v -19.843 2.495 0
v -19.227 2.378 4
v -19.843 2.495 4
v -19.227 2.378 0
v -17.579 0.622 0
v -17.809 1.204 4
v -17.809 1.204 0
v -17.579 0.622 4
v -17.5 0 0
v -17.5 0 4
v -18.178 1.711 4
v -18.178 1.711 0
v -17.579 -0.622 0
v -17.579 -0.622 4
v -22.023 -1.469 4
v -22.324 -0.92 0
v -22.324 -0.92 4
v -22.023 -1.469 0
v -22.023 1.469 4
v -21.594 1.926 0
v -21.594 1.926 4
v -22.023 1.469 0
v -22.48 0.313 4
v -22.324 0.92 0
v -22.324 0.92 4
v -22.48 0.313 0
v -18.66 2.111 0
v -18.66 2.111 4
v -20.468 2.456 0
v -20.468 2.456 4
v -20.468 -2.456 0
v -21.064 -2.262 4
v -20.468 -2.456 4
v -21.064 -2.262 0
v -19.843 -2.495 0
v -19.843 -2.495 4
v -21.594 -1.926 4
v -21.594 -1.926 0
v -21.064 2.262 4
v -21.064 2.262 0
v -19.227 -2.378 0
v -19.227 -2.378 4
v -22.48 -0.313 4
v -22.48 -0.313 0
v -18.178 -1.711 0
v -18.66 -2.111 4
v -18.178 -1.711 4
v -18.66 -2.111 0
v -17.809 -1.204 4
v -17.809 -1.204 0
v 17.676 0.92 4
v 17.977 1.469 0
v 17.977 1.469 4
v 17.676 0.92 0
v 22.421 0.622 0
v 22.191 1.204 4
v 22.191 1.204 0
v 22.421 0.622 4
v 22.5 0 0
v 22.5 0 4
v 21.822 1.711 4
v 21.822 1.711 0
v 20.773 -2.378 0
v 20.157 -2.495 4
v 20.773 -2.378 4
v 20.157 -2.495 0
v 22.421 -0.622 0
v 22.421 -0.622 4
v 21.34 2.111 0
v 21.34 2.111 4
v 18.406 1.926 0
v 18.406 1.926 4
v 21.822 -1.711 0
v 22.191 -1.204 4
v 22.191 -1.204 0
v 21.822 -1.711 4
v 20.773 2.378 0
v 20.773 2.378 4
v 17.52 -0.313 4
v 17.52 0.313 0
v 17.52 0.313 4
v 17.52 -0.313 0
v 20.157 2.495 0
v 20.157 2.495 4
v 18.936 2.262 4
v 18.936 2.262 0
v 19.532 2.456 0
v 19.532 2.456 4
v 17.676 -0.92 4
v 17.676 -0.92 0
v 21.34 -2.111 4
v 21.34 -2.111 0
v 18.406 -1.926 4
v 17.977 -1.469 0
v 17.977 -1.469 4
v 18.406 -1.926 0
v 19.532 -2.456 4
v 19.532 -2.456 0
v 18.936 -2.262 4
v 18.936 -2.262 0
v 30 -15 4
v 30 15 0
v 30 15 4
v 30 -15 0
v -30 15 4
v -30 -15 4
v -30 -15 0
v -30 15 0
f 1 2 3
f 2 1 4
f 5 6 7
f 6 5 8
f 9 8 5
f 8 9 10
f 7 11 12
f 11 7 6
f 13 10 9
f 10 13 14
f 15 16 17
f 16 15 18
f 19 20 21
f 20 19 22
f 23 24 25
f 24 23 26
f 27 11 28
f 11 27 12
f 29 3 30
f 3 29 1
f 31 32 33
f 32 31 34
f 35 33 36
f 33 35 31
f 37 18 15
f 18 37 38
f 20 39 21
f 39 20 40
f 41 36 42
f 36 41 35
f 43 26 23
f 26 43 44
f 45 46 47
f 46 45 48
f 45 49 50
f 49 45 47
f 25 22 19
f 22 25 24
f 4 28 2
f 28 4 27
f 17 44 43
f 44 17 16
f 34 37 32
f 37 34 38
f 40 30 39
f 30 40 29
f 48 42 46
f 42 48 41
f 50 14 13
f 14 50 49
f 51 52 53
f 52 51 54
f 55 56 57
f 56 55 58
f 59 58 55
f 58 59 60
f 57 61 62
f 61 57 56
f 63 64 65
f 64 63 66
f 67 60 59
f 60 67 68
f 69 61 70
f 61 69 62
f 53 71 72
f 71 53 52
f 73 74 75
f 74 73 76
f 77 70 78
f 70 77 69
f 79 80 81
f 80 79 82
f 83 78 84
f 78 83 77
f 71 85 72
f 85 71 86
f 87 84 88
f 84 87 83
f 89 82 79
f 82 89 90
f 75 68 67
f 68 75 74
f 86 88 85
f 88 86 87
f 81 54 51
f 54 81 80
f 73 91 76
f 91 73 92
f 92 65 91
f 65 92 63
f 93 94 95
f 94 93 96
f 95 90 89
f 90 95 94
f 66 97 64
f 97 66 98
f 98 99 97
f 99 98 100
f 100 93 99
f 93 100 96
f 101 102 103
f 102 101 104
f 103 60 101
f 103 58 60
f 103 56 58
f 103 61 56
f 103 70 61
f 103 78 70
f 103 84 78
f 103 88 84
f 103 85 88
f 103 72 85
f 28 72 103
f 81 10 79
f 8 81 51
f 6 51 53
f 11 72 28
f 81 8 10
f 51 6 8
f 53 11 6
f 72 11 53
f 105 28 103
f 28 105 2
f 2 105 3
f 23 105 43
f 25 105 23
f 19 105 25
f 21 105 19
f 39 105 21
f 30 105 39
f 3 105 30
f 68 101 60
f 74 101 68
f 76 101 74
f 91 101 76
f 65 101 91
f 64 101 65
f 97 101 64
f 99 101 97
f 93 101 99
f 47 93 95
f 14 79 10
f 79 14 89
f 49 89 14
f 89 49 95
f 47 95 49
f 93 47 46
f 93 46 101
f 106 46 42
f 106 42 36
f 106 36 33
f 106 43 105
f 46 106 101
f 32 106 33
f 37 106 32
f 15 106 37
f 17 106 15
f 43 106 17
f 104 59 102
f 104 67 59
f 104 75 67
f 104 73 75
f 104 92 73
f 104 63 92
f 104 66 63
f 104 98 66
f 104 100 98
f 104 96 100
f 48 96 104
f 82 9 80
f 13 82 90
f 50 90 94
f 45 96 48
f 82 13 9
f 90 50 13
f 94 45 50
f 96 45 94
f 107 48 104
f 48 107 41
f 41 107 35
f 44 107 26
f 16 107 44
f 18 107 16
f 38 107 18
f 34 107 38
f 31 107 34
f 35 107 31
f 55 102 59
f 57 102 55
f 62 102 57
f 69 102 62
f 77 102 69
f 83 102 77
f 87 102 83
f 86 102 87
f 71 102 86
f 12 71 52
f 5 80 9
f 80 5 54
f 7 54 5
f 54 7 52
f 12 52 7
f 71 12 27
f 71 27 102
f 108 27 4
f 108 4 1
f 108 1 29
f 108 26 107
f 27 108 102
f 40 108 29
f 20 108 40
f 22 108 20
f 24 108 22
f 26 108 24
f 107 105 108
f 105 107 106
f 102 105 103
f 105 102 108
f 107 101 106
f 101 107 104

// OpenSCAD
// SYNTHETIC TEACHING EXAMPLE: not derived from a real photograph.
// Units: mm. No strength, machine fit, or physical print qualification.
// Preview/render in OpenSCAD; export after reviewing the dimensions.
// Values below are defaults. examples/build_plate.py overrides them with
// openscad -D from plate-parameters.csv, the single parameter source.
plate_length = 60;
plate_width = 30;
plate_thickness = 4;
hole_diameter = 5;
hole_spacing = 40;
chord_error = 0.02;
radius = hole_diameter / 2;
segments = max(16, ceil(180 / acos(1 - chord_error / radius)));
assert(plate_length > 0 && plate_width > 0 && plate_thickness > 0);
assert(hole_diameter > 0 && hole_spacing > 0);
assert(hole_spacing + hole_diameter < plate_length);
assert(hole_diameter < plate_width);
assert(chord_error > 0 && chord_error < radius);
difference() {
    translate([-plate_length/2, -plate_width/2, 0])
        cube([plate_length, plate_width, plate_thickness]);
    for (x = [-hole_spacing/2, hole_spacing/2])
        translate([x, 0, -0.1])
            cylinder(h=plate_thickness+0.2, d=hole_diameter, $fn=segments);
}
